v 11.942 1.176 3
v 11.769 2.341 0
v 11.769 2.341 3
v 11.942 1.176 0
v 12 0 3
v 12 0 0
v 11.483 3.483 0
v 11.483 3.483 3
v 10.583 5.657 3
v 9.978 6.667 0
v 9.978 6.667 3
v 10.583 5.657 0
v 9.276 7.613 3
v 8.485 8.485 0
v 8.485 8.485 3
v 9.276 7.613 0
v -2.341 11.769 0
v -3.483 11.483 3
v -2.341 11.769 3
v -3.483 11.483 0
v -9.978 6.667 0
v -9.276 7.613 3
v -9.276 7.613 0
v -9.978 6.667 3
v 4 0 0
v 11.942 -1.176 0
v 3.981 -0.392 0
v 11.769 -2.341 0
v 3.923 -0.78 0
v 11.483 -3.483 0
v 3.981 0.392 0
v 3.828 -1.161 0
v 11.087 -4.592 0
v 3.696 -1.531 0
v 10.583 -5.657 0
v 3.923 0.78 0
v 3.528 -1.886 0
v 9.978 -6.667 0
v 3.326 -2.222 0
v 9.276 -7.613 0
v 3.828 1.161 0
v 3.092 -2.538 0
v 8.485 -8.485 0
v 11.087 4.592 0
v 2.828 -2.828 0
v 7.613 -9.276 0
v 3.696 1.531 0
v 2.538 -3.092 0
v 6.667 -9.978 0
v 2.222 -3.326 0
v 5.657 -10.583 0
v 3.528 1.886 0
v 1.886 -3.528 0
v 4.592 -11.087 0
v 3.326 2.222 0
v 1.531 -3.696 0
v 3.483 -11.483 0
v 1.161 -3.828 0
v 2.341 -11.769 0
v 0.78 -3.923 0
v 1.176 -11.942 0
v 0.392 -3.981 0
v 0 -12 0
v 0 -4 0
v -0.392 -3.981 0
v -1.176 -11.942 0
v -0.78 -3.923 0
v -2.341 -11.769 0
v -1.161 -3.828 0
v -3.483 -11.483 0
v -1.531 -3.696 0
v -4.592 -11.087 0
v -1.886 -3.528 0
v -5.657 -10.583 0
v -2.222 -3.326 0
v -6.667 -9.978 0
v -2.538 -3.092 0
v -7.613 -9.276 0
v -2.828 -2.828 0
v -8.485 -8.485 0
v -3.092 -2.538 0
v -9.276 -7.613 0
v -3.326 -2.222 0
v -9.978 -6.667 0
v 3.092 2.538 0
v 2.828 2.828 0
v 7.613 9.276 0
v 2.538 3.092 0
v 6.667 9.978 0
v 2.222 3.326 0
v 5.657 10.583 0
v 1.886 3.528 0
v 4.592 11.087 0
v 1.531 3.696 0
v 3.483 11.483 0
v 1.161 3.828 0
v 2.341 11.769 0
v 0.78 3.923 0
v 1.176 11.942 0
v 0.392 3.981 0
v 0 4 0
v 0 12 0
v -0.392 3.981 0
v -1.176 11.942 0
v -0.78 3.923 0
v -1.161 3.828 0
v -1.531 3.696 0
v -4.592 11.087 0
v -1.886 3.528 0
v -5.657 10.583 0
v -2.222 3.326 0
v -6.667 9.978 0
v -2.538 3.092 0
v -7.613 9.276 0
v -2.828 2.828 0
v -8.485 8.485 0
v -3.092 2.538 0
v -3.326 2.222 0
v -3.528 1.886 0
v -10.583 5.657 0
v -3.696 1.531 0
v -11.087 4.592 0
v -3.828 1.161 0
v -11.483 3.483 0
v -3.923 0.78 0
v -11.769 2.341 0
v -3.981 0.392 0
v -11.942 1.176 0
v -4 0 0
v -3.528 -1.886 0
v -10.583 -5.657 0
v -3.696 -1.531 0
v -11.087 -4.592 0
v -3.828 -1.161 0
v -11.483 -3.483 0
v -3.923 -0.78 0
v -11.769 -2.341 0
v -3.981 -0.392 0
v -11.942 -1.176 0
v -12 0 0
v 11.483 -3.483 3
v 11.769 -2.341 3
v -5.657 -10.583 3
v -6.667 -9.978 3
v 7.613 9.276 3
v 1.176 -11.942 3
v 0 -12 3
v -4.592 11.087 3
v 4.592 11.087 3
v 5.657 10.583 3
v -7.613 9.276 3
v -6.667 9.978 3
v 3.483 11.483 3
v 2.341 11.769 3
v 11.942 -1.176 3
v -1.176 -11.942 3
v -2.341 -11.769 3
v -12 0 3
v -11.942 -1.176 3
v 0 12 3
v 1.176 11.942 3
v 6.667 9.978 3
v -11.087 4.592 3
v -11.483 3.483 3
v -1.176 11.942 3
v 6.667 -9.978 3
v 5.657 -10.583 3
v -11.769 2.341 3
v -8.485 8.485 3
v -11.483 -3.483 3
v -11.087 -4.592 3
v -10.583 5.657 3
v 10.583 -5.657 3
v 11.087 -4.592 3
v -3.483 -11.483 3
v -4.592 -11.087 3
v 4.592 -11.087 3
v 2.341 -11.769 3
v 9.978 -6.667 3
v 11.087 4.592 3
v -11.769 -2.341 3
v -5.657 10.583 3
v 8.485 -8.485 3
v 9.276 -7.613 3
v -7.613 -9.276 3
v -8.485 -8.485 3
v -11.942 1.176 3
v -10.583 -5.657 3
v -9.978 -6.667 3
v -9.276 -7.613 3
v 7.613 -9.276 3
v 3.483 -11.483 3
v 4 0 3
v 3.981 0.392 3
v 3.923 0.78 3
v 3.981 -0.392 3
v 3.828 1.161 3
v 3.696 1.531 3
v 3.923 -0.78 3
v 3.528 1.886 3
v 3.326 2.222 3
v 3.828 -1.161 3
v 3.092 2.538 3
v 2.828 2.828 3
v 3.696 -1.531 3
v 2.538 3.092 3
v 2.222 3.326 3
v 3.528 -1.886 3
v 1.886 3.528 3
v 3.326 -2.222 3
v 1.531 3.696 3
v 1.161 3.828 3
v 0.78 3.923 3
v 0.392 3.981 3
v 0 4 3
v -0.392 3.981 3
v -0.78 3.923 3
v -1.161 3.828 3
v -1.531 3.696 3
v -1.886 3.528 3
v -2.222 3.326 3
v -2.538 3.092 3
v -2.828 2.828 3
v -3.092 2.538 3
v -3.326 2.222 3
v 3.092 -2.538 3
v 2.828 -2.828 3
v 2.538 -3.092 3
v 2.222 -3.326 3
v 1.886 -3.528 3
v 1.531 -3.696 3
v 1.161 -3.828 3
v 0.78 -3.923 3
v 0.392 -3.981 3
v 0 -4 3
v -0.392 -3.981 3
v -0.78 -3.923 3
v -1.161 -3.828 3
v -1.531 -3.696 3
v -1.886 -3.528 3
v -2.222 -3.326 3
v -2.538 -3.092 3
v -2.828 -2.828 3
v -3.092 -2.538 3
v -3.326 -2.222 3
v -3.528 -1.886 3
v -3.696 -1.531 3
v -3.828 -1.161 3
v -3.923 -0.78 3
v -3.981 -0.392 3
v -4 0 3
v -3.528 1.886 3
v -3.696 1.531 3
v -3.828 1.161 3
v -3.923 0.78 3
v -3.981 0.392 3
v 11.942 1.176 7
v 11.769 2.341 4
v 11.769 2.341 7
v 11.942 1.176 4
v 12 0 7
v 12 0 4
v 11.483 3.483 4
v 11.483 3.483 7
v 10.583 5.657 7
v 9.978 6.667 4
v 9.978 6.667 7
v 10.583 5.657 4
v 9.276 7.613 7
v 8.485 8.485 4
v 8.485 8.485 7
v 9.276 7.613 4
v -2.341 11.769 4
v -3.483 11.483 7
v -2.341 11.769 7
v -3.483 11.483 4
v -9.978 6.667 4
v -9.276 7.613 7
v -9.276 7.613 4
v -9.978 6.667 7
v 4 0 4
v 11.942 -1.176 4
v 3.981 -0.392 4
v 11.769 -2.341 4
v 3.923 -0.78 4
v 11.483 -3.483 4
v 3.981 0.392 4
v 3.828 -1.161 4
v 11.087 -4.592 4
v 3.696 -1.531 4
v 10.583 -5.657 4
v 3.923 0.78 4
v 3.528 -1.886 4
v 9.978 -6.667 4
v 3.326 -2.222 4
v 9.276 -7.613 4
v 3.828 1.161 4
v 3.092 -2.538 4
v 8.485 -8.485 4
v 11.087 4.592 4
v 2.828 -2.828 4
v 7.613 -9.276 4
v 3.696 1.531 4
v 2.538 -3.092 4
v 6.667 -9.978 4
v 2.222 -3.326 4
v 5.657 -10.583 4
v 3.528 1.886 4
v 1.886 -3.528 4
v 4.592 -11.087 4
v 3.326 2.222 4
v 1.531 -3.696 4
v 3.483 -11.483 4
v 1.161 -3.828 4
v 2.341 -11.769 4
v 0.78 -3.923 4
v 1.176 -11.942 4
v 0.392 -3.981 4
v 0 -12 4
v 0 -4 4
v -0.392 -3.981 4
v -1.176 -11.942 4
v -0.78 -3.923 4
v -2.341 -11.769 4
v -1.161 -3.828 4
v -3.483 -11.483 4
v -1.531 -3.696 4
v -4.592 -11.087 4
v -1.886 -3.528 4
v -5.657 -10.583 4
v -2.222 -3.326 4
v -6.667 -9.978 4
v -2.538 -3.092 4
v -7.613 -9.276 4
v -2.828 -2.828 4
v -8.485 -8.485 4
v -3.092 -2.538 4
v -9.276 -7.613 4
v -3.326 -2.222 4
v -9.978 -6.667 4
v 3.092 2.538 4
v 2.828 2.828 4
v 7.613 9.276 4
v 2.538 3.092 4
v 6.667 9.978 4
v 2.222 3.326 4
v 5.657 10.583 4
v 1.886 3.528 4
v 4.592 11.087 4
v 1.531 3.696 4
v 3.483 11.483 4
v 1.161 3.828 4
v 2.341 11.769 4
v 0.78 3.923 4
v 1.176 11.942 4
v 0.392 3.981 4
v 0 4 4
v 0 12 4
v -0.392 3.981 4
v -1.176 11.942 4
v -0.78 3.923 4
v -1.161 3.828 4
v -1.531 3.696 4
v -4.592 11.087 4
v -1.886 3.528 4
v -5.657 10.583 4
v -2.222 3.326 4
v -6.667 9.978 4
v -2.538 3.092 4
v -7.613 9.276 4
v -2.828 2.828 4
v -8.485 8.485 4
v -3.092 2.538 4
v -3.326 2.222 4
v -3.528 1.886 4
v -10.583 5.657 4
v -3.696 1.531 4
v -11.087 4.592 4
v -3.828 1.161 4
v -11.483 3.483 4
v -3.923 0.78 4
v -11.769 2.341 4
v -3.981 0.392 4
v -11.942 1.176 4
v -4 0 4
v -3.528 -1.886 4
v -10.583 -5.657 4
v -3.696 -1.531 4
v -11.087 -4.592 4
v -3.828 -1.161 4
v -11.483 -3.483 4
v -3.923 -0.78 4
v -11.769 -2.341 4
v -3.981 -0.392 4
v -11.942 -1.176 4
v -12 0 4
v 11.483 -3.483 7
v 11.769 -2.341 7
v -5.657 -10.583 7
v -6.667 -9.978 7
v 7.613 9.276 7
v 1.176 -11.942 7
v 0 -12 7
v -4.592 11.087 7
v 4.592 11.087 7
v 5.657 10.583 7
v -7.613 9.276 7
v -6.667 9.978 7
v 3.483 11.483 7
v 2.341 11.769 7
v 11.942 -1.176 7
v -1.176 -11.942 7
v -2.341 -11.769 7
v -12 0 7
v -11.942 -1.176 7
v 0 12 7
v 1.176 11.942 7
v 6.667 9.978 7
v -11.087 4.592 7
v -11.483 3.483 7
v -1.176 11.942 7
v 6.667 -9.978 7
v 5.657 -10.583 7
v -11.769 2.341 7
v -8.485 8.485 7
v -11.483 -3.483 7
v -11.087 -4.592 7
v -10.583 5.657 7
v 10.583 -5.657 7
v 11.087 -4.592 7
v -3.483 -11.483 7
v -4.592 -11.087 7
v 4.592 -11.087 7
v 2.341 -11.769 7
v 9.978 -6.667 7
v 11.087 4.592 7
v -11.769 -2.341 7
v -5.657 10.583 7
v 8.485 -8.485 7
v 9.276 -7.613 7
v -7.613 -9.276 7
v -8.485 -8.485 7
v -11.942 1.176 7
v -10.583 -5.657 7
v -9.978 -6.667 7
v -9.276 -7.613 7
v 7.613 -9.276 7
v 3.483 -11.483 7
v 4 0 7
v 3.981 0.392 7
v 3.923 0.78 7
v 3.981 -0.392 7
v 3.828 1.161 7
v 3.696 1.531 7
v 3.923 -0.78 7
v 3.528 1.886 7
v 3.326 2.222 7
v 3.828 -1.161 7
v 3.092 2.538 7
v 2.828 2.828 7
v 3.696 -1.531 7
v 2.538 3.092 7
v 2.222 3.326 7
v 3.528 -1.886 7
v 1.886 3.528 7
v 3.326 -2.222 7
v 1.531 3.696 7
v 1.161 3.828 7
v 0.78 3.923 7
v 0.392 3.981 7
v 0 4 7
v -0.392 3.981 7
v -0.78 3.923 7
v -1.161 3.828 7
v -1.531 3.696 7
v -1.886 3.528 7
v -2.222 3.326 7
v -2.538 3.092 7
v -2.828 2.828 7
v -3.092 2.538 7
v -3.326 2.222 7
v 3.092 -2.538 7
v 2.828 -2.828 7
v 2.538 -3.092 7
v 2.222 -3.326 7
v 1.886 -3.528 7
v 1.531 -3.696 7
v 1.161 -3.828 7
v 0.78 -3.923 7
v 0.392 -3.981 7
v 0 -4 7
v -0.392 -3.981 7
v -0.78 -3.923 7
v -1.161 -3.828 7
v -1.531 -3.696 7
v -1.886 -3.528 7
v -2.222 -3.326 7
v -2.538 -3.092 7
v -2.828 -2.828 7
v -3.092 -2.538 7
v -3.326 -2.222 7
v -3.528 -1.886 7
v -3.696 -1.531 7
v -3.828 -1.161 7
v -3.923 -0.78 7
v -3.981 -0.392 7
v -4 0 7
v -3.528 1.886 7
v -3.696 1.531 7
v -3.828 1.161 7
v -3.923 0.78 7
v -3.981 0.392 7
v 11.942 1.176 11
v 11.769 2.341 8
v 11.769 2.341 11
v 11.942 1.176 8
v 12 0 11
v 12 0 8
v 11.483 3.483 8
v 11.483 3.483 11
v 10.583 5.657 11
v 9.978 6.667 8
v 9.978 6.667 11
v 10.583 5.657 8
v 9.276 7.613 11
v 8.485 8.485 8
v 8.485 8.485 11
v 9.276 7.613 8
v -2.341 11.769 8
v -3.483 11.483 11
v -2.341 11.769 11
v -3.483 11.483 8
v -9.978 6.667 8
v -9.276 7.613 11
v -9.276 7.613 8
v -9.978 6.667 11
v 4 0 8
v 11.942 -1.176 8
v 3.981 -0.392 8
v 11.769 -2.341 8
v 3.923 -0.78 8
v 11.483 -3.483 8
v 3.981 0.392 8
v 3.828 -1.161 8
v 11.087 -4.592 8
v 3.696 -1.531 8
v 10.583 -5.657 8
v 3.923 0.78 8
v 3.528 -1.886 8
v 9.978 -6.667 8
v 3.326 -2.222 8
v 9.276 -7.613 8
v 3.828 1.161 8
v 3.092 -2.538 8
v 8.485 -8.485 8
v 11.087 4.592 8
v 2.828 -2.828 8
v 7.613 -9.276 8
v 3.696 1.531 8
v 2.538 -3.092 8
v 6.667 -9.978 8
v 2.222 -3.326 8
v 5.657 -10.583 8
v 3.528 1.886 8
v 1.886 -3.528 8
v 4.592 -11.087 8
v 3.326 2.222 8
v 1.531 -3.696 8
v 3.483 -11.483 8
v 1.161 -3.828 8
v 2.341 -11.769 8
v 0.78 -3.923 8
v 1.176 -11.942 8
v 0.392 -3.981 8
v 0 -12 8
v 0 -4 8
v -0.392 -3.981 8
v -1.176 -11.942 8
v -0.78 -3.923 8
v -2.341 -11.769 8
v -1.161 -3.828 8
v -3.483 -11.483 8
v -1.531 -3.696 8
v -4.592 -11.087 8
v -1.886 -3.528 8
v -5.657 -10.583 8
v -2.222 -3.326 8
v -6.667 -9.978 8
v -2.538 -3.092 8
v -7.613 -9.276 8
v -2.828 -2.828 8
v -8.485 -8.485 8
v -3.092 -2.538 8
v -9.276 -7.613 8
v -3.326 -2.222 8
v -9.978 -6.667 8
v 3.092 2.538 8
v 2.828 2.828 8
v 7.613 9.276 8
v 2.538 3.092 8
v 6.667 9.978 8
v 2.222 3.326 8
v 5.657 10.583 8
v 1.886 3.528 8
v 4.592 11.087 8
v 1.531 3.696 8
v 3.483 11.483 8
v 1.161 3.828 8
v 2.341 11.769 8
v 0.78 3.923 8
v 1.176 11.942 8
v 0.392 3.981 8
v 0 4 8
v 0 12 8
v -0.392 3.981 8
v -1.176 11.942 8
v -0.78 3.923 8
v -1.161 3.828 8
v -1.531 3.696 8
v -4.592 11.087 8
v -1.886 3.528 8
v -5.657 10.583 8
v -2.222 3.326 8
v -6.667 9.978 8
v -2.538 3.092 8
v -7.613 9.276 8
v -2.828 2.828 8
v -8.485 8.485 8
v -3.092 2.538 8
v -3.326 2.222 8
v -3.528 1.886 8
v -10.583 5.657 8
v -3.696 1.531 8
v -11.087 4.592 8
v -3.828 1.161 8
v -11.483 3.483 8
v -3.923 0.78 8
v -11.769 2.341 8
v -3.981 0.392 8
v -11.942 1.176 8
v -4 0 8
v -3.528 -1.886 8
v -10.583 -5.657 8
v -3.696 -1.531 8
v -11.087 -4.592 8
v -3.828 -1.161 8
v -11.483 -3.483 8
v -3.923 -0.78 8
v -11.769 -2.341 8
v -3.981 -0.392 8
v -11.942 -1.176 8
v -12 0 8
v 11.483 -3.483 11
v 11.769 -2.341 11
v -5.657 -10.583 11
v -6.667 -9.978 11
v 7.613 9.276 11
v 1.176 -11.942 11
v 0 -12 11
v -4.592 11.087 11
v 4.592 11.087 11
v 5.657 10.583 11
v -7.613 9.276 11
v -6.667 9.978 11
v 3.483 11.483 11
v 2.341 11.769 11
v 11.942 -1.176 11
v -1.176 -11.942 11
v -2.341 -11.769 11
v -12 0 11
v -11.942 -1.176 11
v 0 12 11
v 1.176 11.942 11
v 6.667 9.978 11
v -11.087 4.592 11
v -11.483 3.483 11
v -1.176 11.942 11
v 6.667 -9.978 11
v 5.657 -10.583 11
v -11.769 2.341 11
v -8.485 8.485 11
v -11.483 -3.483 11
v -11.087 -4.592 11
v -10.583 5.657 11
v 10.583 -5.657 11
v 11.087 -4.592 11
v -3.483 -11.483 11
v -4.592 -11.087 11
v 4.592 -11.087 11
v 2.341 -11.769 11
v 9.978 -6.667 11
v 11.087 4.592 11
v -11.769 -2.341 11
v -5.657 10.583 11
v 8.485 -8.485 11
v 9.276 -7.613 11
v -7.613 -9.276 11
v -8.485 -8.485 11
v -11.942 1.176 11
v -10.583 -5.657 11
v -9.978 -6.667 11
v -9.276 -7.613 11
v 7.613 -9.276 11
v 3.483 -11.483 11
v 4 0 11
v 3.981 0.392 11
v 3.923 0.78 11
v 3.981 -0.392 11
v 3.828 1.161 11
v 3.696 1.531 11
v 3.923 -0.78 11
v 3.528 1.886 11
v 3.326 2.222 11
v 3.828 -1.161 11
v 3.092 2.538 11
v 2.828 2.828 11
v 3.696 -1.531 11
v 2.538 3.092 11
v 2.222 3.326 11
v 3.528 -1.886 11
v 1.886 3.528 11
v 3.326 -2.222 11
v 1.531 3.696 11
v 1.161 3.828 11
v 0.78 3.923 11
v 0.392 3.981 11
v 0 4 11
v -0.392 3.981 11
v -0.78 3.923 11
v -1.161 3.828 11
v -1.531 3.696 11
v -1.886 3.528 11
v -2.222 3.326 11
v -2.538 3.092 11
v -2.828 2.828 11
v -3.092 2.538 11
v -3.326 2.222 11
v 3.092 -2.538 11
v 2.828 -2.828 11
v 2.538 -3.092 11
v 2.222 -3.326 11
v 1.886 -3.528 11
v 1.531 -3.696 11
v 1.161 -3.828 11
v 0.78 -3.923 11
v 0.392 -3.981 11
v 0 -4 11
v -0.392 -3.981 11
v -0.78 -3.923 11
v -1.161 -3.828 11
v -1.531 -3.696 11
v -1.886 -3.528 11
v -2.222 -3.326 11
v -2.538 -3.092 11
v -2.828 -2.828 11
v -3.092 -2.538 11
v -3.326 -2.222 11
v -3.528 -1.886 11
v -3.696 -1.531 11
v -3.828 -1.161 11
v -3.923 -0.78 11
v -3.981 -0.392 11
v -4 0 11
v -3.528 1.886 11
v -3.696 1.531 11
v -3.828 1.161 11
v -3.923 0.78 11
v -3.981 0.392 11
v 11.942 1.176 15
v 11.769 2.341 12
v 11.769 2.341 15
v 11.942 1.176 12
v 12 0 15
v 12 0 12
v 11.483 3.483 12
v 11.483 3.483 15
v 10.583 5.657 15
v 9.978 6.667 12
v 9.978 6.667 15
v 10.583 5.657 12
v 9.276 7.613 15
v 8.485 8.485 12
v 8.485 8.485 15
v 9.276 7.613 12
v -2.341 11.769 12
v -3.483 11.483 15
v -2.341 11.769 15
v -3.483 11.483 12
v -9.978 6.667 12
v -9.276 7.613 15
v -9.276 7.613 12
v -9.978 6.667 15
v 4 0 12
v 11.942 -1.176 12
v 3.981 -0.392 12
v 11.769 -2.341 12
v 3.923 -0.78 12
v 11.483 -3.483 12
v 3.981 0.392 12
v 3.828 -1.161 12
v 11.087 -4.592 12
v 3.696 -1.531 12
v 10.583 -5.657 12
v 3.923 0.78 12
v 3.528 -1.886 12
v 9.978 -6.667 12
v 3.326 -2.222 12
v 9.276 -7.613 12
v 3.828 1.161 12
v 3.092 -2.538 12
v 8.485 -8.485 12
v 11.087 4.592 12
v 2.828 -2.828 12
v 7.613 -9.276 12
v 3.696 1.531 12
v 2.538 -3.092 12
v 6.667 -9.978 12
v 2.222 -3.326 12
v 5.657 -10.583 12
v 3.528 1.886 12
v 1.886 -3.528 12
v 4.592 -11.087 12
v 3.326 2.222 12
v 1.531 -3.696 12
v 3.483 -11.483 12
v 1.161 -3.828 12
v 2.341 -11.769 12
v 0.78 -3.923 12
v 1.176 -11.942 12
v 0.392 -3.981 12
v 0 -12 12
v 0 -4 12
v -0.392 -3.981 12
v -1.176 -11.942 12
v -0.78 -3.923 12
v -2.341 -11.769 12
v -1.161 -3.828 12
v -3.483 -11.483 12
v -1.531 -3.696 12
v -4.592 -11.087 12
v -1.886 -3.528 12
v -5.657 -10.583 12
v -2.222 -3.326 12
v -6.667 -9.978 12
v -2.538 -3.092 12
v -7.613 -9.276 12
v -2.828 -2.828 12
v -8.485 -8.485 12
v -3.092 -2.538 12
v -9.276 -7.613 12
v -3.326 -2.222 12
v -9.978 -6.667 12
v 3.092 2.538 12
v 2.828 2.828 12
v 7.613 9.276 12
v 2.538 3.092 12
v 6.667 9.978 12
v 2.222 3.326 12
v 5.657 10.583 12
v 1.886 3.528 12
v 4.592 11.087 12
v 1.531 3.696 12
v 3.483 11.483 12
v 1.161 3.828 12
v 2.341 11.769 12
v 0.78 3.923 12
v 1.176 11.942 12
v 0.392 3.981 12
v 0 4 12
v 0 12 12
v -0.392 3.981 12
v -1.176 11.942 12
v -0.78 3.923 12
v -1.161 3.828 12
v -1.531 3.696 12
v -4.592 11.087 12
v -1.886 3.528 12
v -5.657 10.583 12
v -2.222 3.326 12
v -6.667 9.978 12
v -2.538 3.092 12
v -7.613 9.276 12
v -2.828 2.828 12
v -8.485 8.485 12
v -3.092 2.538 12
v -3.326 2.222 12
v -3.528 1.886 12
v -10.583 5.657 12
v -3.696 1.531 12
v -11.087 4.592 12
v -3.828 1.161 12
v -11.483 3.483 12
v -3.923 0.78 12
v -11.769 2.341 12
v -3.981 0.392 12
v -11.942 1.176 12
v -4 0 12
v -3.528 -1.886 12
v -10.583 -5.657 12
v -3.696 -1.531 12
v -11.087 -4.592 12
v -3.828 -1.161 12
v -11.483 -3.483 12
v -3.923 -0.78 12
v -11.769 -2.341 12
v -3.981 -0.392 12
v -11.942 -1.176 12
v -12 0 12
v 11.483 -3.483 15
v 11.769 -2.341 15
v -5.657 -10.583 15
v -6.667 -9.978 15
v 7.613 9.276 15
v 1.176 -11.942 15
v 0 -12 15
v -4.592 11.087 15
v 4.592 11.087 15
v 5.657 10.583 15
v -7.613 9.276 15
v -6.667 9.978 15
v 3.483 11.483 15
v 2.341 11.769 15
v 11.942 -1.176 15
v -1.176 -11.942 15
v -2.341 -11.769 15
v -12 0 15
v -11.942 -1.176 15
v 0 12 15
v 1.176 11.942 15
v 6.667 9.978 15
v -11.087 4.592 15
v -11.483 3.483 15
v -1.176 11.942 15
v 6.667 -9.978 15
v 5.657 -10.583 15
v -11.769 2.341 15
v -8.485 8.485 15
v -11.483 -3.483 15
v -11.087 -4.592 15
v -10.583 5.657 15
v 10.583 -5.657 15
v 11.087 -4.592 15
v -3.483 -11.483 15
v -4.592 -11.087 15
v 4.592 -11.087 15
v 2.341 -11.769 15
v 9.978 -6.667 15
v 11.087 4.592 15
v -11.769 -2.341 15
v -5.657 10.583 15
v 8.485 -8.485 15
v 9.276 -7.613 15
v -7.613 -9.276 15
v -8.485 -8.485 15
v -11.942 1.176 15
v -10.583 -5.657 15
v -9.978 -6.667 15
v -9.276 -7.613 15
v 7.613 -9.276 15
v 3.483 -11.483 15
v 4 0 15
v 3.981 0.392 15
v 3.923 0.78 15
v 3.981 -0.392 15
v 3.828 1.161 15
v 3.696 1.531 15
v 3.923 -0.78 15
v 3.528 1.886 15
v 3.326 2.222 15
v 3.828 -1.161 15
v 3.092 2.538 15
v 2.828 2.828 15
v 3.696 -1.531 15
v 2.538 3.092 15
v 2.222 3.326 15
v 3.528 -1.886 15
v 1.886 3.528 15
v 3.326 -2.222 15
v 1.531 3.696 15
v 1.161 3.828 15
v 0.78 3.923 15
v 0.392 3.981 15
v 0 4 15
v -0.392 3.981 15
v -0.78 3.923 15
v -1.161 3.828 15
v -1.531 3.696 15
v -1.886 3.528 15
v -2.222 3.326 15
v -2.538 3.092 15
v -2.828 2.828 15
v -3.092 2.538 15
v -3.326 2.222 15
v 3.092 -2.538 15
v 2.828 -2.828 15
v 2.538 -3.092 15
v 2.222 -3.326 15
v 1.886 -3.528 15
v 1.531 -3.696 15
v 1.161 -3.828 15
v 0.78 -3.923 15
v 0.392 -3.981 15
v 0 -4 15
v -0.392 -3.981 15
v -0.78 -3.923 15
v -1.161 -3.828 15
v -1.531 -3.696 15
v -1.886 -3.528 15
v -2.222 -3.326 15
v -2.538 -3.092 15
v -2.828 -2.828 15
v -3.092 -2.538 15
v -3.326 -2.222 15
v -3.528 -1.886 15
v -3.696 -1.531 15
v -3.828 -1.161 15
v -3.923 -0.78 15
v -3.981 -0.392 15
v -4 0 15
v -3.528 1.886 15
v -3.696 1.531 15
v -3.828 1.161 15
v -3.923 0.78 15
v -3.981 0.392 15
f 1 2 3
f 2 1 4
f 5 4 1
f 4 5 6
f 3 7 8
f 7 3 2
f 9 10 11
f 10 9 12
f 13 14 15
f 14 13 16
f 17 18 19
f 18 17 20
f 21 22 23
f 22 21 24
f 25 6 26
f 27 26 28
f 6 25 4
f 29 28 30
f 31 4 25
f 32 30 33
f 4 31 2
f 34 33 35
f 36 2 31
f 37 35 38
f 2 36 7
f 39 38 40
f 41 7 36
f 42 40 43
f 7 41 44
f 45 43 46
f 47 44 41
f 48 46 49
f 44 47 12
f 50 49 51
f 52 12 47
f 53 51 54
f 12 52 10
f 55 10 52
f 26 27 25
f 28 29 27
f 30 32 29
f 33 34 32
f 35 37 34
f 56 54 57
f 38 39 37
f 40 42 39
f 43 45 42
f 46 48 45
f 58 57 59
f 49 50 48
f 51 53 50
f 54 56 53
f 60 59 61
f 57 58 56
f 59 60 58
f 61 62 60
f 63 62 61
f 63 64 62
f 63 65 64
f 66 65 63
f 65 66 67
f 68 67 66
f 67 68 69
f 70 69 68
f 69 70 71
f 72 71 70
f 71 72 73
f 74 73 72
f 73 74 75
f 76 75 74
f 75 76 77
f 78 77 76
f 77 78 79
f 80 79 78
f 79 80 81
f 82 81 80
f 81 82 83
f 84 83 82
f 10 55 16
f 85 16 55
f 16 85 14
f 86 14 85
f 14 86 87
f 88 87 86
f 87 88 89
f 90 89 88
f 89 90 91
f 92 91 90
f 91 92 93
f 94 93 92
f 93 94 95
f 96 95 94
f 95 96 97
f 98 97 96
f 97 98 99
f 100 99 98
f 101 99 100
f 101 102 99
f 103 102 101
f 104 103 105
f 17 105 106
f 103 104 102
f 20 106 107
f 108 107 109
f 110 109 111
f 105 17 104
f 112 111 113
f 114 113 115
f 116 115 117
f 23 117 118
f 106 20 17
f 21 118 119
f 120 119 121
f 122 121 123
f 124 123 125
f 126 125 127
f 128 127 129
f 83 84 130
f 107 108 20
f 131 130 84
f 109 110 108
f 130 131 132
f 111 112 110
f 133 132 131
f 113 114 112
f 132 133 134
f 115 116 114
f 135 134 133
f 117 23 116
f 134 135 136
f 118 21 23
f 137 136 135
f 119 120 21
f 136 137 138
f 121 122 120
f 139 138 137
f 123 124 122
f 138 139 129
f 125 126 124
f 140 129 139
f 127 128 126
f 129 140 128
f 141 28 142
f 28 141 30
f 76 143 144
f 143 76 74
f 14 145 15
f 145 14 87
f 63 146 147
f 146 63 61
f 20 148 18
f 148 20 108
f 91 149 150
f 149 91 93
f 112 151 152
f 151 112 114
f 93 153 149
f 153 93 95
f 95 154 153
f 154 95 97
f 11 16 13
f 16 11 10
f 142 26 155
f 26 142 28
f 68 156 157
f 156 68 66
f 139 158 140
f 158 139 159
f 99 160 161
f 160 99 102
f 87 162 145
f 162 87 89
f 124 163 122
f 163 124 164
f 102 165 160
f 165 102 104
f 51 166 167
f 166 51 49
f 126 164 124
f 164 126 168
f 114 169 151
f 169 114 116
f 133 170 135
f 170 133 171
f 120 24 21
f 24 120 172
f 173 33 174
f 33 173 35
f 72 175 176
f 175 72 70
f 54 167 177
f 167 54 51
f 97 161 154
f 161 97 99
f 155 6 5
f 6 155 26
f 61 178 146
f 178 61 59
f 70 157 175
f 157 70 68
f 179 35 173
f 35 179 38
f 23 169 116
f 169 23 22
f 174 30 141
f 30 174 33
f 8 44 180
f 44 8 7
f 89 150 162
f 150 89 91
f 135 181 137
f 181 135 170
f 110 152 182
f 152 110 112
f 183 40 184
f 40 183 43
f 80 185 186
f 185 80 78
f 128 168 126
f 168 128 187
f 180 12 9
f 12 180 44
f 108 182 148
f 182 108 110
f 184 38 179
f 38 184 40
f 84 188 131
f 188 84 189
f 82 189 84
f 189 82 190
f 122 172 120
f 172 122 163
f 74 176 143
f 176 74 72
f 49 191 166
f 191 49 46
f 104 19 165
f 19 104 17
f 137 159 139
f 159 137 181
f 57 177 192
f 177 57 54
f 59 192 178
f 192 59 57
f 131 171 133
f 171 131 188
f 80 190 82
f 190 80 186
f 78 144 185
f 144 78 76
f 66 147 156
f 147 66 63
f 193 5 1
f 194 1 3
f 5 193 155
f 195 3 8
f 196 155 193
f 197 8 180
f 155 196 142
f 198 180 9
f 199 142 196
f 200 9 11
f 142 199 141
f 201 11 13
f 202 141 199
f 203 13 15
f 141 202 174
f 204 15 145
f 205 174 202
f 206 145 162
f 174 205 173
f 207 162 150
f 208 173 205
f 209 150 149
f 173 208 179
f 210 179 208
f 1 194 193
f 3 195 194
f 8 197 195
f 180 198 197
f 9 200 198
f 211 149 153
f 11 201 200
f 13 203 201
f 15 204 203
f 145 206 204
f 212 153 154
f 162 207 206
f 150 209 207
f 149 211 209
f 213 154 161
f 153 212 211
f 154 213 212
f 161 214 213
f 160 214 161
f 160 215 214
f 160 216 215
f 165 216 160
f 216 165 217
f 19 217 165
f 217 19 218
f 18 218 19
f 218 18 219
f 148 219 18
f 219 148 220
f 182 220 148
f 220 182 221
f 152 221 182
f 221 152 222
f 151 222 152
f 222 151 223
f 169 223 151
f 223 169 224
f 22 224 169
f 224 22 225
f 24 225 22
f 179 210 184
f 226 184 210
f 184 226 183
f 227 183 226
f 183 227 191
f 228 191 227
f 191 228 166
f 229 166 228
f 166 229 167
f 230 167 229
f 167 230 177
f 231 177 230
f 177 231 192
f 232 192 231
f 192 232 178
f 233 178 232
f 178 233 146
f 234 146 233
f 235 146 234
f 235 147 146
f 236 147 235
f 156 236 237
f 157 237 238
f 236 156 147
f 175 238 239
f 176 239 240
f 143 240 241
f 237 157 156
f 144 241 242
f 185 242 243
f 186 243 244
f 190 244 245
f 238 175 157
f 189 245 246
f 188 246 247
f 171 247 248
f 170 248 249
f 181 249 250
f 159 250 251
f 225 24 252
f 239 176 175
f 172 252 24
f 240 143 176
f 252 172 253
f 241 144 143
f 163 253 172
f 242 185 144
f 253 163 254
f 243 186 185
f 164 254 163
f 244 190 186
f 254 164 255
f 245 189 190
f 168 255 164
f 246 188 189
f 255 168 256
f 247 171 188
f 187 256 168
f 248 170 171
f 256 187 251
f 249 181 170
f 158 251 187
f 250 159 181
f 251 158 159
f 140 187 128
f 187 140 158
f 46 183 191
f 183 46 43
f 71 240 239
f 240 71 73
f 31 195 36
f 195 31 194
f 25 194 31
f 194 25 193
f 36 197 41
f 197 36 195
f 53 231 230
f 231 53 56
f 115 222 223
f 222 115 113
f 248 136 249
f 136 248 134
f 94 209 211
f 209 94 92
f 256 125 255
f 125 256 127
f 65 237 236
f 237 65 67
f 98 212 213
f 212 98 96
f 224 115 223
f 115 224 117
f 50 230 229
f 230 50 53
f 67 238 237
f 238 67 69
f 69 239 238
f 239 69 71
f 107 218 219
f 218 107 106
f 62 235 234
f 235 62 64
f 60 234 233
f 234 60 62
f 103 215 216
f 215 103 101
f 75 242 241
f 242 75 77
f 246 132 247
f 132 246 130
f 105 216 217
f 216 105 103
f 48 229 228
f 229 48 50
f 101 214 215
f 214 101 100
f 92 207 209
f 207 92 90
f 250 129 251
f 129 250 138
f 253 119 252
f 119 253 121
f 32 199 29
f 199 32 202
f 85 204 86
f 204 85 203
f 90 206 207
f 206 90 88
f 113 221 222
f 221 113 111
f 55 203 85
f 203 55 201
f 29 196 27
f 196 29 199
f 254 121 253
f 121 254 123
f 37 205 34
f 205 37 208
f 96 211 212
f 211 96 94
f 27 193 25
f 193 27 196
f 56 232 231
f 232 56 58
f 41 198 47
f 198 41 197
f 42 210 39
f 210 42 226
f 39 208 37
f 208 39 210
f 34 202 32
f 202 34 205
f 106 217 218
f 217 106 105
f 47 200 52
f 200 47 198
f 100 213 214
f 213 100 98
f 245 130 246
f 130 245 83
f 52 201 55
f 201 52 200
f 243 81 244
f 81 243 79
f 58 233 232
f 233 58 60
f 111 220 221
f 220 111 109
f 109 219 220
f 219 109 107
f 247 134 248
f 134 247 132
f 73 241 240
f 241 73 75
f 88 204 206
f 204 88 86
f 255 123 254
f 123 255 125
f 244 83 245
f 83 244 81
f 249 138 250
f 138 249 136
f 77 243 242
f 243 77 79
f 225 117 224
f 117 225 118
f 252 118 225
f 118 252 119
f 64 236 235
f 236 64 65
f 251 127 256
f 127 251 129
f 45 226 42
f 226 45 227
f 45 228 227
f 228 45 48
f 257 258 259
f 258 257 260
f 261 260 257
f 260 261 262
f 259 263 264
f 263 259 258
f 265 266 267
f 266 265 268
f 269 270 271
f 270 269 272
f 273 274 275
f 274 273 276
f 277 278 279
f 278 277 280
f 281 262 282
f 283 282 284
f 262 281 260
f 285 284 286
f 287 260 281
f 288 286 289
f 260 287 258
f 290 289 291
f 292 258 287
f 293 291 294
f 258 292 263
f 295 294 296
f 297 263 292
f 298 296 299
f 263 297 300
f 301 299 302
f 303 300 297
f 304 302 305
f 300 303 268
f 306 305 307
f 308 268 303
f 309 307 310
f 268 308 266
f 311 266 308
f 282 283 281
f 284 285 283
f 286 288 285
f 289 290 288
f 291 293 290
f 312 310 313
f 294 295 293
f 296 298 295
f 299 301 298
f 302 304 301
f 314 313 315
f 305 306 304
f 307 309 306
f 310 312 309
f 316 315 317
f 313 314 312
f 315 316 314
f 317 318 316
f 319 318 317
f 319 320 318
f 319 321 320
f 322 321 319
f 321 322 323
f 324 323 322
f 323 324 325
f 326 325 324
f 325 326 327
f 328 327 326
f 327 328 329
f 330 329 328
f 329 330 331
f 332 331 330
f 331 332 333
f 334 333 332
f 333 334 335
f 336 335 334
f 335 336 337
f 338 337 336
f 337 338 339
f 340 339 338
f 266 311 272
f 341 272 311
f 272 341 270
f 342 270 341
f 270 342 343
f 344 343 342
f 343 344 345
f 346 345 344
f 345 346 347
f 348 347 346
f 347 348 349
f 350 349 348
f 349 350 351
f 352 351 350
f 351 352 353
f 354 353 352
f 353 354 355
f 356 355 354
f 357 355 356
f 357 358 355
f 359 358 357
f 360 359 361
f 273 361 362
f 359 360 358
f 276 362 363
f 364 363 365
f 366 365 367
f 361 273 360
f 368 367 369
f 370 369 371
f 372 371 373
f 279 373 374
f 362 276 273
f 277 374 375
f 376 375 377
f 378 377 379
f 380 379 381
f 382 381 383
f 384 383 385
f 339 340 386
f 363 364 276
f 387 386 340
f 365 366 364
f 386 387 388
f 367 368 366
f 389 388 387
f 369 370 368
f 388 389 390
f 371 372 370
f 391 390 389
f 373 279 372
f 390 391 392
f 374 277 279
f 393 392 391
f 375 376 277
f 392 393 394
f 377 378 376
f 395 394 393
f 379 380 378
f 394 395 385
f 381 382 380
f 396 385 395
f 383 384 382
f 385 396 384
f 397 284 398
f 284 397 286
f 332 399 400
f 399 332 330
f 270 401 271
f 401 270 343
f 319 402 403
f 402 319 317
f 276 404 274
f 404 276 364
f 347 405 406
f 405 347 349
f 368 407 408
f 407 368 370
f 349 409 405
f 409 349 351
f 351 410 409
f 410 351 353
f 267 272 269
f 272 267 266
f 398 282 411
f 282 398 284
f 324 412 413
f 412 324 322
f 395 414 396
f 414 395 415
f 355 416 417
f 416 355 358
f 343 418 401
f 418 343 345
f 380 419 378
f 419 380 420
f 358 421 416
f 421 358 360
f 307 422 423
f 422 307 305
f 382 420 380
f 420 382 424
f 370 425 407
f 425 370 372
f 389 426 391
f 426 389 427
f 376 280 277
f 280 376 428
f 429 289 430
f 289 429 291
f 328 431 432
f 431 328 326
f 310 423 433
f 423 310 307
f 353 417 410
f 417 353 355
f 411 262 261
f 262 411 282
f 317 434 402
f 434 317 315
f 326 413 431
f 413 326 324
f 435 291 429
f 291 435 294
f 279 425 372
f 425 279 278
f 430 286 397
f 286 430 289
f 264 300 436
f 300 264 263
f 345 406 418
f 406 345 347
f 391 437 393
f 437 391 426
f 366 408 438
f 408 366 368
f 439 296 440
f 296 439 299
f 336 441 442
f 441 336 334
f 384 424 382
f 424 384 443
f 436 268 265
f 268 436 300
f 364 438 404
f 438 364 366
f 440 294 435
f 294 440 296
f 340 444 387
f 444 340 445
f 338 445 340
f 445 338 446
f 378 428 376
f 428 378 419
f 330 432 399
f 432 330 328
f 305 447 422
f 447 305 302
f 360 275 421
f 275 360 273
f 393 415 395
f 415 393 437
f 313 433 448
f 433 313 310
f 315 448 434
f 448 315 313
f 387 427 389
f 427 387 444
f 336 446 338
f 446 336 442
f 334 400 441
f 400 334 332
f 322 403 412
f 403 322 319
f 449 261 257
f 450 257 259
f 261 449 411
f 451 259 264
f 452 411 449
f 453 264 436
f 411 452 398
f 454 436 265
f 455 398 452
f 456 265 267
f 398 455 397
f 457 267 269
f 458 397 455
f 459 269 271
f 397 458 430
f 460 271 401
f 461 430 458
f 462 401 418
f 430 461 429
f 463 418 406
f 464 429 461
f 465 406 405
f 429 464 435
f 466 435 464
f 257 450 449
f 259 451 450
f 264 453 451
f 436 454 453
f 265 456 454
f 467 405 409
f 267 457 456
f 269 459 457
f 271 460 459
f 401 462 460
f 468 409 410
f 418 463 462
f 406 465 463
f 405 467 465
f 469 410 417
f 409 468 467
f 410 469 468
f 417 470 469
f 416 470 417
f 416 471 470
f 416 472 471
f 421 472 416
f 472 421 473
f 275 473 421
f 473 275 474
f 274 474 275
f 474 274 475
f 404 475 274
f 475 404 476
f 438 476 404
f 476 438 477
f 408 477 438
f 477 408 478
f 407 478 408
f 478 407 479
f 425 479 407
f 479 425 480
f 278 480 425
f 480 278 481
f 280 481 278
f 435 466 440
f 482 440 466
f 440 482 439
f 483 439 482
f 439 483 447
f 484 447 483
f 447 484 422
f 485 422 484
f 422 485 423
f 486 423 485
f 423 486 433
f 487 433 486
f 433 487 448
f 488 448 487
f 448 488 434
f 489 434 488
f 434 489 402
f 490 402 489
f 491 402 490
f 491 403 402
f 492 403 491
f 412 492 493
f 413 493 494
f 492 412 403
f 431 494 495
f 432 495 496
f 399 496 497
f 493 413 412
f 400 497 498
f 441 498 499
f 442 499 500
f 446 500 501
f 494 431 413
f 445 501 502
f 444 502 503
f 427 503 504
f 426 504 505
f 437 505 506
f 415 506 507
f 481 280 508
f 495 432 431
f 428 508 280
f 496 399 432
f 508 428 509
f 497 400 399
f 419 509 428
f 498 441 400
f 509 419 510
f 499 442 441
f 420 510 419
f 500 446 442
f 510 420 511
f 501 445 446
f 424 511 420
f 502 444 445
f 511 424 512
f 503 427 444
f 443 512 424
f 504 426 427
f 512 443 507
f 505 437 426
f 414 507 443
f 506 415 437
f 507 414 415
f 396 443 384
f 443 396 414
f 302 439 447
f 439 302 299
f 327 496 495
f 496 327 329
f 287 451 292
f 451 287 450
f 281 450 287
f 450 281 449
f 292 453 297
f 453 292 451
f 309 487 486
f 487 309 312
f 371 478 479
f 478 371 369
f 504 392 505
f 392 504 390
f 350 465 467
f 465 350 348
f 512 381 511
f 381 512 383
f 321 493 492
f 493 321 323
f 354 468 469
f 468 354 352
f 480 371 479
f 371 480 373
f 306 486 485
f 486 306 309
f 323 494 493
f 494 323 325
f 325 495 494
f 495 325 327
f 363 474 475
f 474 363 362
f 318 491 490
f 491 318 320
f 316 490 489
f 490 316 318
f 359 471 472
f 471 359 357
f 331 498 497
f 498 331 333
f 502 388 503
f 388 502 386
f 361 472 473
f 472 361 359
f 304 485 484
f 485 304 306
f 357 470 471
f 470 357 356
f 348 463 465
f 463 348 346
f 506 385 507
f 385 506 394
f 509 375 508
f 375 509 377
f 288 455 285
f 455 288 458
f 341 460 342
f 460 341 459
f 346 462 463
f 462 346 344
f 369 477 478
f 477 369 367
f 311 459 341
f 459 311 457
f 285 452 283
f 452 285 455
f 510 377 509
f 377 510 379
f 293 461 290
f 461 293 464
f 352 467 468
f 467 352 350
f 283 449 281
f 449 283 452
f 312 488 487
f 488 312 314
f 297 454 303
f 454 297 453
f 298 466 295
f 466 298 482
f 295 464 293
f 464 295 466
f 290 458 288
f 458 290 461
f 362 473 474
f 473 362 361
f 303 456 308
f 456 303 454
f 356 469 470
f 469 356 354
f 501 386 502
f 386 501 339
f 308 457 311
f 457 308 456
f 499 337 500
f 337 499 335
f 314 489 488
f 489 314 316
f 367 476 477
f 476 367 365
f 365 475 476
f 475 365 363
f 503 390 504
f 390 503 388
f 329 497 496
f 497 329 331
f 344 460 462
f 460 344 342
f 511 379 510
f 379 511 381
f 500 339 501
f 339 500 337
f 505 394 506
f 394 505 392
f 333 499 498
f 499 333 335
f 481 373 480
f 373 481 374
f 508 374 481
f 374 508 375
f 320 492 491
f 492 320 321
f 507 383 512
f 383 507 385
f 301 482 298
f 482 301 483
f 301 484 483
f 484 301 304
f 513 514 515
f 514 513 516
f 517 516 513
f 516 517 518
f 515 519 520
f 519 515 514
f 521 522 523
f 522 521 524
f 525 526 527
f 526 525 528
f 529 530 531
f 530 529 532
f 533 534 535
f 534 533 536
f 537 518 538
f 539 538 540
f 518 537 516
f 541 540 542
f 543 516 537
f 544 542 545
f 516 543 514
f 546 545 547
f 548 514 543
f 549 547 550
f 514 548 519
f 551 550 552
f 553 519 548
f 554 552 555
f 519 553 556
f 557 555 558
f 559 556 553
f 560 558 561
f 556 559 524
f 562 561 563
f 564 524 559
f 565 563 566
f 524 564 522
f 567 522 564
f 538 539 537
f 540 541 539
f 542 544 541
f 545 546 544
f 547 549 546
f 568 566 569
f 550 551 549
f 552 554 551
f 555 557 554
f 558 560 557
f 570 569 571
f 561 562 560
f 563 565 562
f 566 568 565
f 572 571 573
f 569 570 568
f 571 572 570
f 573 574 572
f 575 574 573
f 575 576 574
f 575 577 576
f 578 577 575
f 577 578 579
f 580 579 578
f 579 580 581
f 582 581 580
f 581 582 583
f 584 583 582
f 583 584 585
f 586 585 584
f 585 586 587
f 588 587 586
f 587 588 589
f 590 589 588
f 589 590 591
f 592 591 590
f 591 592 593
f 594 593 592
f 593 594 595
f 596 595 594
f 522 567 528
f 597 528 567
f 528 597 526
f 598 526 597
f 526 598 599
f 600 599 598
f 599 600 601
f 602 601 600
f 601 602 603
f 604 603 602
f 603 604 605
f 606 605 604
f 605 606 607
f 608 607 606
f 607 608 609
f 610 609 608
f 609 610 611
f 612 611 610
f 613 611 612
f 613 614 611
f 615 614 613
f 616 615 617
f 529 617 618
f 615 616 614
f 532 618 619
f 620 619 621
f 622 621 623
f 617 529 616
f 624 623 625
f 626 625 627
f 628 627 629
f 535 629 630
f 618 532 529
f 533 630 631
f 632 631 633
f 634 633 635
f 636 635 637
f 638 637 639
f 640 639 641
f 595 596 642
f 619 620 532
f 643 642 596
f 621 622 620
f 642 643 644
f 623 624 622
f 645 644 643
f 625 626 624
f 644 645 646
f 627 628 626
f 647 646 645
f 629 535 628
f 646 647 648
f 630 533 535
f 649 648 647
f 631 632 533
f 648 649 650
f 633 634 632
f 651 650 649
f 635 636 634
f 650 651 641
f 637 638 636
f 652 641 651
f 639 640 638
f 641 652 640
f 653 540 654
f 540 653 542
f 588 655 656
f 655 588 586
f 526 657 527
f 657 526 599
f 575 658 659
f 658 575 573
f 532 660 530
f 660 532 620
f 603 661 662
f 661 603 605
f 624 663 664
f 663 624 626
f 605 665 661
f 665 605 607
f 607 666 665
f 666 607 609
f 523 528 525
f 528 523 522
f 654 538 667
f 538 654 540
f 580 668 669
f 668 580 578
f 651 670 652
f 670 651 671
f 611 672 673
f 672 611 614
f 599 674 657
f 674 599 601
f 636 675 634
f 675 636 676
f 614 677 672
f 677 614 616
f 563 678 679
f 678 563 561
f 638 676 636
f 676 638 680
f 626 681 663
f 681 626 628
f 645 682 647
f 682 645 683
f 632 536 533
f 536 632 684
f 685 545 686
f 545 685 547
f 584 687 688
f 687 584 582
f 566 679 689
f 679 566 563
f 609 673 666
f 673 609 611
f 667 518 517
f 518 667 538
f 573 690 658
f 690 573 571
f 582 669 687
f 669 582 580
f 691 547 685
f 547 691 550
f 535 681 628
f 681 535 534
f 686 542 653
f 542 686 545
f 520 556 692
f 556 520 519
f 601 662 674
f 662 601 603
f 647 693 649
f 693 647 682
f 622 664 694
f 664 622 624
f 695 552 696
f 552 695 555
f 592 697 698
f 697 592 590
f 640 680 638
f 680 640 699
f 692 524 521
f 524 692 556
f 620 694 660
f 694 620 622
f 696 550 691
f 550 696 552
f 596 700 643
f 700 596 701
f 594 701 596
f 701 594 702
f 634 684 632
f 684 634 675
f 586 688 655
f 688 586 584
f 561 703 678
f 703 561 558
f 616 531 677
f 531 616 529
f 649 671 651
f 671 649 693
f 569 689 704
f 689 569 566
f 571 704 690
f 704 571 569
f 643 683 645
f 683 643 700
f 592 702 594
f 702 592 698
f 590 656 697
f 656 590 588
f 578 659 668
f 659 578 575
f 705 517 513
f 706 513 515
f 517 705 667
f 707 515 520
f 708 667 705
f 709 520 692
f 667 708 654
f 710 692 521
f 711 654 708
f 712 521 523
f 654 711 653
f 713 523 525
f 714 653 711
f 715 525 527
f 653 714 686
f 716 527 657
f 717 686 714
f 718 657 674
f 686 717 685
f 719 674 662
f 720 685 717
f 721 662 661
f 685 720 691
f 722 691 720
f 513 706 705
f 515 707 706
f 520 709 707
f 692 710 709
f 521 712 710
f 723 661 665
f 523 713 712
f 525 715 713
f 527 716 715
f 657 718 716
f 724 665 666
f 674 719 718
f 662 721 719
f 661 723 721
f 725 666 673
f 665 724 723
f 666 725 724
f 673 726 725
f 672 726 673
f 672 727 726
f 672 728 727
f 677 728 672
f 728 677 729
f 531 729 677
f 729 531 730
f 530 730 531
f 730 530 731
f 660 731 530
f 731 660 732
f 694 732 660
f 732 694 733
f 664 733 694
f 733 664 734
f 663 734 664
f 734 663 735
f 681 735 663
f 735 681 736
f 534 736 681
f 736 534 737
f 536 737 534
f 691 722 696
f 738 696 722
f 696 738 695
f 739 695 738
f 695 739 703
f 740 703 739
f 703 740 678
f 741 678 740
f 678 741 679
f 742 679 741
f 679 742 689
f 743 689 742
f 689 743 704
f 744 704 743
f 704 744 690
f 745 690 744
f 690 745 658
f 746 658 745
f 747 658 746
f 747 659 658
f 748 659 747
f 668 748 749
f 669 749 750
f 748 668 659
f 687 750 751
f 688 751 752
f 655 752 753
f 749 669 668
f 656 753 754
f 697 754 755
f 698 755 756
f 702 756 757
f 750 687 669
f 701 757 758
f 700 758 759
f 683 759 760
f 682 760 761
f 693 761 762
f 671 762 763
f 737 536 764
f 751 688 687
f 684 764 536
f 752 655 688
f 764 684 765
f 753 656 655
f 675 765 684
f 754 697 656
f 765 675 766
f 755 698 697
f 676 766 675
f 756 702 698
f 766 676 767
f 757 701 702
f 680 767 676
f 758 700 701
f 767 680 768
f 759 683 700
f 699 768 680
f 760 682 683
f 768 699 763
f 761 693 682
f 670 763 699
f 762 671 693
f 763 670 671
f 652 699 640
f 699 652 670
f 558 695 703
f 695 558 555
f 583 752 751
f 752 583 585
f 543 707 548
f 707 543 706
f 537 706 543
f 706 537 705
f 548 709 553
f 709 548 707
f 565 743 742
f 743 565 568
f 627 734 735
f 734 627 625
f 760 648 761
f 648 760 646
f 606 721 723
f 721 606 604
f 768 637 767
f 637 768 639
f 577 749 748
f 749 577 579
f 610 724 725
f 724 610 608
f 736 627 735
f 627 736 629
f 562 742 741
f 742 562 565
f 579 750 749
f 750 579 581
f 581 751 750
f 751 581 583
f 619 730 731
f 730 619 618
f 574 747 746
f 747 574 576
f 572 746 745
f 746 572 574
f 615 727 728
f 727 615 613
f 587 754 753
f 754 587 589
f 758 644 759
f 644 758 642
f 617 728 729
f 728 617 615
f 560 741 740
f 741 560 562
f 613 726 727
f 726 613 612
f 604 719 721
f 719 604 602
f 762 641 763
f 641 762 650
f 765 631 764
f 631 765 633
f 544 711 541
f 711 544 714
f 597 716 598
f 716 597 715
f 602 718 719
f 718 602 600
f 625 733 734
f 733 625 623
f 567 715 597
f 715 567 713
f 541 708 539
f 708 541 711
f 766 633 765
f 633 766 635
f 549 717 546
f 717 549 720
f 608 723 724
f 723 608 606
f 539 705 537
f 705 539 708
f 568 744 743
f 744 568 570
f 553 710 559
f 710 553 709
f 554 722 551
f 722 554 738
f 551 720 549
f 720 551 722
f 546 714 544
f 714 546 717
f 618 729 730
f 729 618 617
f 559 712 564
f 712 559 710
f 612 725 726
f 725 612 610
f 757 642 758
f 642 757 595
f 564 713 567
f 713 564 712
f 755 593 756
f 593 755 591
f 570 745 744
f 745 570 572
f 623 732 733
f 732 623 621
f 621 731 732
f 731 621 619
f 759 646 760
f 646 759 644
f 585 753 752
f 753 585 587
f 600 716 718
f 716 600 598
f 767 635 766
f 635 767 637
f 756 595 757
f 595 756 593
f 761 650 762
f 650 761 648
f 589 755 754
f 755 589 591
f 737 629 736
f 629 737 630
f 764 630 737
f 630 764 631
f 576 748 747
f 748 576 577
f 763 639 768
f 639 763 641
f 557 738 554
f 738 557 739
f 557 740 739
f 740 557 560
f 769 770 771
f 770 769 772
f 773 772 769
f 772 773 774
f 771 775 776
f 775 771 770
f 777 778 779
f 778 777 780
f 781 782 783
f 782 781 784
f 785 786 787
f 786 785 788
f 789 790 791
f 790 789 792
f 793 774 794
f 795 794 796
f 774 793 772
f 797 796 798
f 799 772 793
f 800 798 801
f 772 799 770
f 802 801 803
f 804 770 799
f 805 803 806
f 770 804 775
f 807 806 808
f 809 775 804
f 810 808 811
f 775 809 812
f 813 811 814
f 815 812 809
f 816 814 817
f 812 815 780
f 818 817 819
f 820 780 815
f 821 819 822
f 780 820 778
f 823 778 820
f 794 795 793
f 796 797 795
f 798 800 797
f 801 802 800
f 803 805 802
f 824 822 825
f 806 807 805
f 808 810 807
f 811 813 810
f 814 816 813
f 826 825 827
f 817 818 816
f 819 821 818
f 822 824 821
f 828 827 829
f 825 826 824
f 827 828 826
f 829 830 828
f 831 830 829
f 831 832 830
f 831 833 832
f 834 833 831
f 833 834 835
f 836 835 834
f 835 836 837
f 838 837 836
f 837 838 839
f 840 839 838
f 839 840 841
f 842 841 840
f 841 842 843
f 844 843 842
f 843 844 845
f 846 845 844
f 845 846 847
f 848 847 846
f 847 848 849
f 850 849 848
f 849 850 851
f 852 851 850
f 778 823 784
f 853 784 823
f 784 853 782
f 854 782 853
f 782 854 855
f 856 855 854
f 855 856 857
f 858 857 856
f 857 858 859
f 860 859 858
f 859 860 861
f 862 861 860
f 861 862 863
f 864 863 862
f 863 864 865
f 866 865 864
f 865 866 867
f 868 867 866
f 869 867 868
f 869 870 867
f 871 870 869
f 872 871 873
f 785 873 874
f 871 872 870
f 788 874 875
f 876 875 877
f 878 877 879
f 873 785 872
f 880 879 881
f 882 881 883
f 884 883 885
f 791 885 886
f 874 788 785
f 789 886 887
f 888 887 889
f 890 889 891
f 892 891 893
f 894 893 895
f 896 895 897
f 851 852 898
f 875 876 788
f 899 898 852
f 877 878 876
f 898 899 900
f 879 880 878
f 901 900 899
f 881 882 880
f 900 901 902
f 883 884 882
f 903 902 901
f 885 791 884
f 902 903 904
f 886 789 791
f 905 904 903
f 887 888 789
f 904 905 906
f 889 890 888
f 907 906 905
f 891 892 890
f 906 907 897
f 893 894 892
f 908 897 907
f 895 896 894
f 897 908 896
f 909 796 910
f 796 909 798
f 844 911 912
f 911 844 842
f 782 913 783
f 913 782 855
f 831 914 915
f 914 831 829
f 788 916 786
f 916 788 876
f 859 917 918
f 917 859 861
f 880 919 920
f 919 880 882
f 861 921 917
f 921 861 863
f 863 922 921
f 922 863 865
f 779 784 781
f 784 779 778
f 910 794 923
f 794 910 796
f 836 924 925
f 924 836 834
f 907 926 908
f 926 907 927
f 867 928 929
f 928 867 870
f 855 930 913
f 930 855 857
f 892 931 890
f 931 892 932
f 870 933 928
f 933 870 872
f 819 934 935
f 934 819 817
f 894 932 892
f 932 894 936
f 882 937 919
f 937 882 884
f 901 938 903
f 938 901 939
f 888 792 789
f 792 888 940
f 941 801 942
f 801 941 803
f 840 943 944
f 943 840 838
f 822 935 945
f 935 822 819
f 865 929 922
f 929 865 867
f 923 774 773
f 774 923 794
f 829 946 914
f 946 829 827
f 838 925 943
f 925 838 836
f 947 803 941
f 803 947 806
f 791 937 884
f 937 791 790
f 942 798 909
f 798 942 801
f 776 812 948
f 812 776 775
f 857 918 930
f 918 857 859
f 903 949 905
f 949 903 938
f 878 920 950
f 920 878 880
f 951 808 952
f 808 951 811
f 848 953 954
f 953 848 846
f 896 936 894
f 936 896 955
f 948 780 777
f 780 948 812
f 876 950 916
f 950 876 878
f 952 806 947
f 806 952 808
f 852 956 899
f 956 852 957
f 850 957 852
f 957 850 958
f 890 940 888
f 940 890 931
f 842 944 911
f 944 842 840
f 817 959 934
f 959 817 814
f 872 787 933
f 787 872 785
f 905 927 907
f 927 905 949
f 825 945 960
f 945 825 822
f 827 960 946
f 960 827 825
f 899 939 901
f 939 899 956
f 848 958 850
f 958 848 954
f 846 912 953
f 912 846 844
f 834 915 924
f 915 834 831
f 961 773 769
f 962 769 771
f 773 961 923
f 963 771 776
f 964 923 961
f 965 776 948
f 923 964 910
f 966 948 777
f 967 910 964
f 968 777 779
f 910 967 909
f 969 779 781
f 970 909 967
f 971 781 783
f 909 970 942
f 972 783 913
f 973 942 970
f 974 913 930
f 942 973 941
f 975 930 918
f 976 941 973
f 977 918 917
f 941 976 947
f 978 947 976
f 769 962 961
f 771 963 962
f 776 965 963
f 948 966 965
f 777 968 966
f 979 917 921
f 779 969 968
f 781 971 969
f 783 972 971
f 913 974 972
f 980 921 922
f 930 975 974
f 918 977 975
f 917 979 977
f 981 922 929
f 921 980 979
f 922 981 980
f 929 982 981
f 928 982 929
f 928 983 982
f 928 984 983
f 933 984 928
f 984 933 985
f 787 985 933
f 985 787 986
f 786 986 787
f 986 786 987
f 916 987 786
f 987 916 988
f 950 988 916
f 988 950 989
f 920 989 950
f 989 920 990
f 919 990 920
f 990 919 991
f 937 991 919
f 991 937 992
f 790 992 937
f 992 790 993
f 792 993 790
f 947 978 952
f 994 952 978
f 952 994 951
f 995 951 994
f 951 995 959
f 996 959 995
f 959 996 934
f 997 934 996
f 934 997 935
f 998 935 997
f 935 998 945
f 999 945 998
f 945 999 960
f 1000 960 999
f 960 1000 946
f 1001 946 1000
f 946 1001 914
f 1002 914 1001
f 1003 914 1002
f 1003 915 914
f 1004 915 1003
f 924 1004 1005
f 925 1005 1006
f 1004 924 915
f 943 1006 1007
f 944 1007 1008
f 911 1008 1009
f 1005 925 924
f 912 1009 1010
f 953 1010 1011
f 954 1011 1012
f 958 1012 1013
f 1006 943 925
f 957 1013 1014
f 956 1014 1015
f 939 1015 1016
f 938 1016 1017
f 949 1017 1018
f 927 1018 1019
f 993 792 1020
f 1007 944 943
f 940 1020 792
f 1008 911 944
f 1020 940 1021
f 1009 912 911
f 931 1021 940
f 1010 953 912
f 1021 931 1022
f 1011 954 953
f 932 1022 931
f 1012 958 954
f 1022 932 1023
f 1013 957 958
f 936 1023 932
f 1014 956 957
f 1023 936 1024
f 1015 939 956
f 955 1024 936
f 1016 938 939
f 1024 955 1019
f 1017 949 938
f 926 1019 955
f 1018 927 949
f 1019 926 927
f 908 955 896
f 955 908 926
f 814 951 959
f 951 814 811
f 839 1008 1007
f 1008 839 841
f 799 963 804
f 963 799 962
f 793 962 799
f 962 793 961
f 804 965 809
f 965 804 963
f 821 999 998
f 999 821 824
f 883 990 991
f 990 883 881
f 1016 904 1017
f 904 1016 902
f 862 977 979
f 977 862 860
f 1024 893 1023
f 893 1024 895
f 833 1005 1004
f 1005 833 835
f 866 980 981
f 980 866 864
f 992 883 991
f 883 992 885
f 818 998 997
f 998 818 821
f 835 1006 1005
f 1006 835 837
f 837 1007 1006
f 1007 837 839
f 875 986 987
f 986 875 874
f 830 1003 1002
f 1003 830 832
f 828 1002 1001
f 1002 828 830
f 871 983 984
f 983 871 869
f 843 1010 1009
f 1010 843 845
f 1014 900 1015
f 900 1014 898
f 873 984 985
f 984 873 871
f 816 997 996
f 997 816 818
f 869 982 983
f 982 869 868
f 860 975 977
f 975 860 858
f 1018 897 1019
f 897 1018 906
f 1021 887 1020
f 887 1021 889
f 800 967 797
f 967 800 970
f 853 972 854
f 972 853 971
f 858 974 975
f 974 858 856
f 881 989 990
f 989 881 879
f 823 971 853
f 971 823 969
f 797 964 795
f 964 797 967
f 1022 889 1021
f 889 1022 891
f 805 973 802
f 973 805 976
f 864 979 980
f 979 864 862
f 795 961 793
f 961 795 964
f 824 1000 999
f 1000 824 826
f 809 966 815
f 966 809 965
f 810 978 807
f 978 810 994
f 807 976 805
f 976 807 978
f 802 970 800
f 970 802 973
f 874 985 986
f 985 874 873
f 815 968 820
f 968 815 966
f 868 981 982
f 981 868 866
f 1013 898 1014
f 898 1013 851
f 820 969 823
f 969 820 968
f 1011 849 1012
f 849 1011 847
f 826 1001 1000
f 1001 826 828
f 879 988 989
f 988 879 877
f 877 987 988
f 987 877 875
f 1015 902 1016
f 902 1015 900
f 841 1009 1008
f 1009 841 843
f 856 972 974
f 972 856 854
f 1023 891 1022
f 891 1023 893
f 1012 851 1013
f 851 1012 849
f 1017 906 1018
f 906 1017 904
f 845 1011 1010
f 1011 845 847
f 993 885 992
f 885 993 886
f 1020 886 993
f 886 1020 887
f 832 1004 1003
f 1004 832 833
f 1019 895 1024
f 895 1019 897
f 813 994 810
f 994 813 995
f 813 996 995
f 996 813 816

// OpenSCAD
// Generated with SolidPython2 for OpenSCAD task-034
$fn = 64;

union() {
	translate(v = [0, 0, 0]) {
		difference() {
			cylinder(h = 3, r = 12);
			cylinder(h = 4, r = 4);
		}
	}
	translate(v = [0, 0, 4]) {
		difference() {
			cylinder(h = 3, r = 12);
			cylinder(h = 4, r = 4);
		}
	}
	translate(v = [0, 0, 8]) {
		difference() {
			cylinder(h = 3, r = 12);
			cylinder(h = 4, r = 4);
		}
	}
	translate(v = [0, 0, 12]) {
		difference() {
			cylinder(h = 3, r = 12);
			cylinder(h = 4, r = 4);
		}
	}
}
